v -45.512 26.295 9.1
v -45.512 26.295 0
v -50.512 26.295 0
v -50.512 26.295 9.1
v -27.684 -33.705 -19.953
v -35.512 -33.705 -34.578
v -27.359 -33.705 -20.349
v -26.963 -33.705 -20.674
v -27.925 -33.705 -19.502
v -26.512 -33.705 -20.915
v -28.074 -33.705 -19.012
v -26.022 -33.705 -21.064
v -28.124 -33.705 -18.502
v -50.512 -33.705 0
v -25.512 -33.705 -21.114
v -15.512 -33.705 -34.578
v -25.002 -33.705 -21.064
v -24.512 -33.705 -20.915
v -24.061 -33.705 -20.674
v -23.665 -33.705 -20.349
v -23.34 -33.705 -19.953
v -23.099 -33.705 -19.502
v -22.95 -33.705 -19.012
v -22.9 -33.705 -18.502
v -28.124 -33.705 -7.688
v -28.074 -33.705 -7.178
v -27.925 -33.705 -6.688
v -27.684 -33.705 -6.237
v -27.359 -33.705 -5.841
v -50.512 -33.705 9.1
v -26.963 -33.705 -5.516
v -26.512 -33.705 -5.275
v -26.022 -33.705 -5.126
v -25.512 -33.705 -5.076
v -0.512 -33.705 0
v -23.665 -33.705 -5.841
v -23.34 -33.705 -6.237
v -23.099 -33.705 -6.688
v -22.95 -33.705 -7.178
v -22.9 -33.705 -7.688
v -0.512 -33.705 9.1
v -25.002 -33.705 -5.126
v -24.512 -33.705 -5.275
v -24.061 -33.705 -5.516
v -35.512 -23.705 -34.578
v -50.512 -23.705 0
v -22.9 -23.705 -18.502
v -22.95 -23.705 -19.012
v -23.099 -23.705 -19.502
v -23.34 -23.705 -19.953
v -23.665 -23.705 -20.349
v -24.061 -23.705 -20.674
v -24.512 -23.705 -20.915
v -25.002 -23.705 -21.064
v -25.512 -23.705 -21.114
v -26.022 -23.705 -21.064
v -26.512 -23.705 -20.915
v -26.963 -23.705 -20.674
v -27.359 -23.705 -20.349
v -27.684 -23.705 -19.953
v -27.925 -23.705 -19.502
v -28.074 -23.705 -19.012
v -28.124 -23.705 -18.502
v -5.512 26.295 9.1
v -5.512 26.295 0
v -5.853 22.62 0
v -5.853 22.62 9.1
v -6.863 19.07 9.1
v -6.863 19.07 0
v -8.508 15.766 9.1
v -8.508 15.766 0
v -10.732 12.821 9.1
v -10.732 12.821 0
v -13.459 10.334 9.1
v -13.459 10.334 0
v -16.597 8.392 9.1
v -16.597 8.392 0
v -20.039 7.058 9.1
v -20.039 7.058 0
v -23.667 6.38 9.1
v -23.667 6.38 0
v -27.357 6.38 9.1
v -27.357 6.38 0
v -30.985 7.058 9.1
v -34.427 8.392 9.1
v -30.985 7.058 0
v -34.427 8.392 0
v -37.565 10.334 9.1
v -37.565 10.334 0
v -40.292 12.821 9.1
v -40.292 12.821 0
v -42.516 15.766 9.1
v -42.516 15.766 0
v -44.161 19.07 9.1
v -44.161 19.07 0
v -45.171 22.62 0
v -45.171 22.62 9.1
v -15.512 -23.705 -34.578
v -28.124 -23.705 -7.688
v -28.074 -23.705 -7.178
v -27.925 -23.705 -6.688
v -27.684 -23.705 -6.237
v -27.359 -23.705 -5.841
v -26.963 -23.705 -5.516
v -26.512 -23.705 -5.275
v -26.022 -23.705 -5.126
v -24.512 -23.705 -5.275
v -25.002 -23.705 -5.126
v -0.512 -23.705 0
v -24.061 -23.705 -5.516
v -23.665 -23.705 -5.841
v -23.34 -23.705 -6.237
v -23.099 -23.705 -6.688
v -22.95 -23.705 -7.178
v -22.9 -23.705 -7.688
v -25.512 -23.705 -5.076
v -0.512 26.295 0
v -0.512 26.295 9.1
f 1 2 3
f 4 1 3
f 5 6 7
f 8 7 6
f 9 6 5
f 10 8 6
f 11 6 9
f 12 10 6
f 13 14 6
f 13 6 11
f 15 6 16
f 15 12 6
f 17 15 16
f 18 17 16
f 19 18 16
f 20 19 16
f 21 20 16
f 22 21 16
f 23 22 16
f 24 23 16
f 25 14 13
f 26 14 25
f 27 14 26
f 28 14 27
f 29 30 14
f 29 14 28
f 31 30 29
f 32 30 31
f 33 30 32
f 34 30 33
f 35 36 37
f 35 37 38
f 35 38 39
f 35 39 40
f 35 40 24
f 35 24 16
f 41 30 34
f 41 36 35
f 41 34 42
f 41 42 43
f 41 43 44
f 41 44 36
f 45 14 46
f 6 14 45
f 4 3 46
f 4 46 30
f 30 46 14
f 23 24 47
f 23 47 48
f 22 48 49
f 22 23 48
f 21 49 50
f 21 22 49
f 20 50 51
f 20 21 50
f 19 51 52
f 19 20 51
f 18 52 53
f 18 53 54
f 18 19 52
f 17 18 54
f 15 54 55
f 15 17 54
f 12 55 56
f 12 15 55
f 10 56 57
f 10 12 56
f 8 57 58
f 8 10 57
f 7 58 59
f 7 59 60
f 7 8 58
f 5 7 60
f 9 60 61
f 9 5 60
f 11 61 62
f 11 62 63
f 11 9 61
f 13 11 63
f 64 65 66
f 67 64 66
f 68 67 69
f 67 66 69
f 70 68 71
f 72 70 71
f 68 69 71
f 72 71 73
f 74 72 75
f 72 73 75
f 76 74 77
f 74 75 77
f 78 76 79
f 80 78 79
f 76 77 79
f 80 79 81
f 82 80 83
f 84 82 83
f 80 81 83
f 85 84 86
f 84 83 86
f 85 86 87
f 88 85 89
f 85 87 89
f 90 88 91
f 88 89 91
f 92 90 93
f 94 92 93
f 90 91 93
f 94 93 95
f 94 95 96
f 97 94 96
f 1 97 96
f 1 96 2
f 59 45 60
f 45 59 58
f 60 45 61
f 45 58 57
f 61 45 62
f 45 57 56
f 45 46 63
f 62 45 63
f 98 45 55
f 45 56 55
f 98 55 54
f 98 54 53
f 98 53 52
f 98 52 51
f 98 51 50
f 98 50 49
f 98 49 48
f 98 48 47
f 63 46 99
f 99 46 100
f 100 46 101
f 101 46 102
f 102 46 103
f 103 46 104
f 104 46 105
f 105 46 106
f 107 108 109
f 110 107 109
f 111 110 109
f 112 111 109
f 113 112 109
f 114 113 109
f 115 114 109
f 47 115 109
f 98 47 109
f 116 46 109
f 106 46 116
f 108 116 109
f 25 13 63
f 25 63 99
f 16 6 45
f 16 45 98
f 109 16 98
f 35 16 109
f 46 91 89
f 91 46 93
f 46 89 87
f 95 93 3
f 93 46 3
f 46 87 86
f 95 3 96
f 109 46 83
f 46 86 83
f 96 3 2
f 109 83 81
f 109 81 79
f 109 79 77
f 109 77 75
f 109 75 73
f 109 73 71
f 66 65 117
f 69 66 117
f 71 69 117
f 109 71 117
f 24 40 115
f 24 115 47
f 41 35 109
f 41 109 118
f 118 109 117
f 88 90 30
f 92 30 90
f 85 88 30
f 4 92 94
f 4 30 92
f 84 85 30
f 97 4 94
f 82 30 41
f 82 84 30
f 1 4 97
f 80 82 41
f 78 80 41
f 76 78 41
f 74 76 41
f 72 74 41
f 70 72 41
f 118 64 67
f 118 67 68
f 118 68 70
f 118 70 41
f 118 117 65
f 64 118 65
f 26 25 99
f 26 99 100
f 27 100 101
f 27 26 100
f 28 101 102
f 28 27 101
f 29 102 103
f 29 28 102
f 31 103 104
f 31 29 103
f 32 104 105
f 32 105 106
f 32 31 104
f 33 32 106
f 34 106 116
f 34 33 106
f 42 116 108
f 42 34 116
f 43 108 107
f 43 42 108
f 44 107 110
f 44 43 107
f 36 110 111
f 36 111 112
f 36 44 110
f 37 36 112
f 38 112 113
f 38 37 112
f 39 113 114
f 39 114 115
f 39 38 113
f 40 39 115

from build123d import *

# Parameters (mm, degrees)
F1_DEPTH = 9.1
F3_DEPTH = 10


with BuildPart() as f1:
    # F0 (on Top) → F1 (new body)
    with BuildSketch(Plane.XY):
        with BuildLine():
            Line((-45.512, 26.294801), (-50.512, 26.294801))
            Line((-50.512, 26.294801), (-50.512, -33.705199))
            Line((-50.512, -33.705199), (-0.512, -33.705199))
            Line((-0.512, -33.705199), (-0.512, 26.294801))
            Line((-0.512, 26.294801), (-5.512, 26.294801))
            ThreePointArc((-5.512, 26.294801), (-25.512, 6.294801), (-45.512, 26.294801))
        make_face()
    extrude(amount=F1_DEPTH)

    # F2 (on face) → F3 (join)
    with BuildSketch(Plane.XZ.offset(33.705199)):
        Polygon((-0.512, 0), (-50.512, 0), (-35.512, -34.577517), (-15.512, -34.577517), align=None)
        with BuildLine():
            ThreePointArc((-28.124191, -7.687931), (-25.512, -5.075741), (-22.89981, -7.687931))
            Line((-22.89981, -7.687931), (-22.89981, -18.501936))
            ThreePointArc((-22.89981, -18.501936), (-25.512, -21.114126), (-28.124191, -18.501936))
            Line((-28.124191, -18.501936), (-28.124191, -7.687931))
        make_face(mode=Mode.SUBTRACT)
    extrude(amount=-F3_DEPTH)


solid = f1.part
